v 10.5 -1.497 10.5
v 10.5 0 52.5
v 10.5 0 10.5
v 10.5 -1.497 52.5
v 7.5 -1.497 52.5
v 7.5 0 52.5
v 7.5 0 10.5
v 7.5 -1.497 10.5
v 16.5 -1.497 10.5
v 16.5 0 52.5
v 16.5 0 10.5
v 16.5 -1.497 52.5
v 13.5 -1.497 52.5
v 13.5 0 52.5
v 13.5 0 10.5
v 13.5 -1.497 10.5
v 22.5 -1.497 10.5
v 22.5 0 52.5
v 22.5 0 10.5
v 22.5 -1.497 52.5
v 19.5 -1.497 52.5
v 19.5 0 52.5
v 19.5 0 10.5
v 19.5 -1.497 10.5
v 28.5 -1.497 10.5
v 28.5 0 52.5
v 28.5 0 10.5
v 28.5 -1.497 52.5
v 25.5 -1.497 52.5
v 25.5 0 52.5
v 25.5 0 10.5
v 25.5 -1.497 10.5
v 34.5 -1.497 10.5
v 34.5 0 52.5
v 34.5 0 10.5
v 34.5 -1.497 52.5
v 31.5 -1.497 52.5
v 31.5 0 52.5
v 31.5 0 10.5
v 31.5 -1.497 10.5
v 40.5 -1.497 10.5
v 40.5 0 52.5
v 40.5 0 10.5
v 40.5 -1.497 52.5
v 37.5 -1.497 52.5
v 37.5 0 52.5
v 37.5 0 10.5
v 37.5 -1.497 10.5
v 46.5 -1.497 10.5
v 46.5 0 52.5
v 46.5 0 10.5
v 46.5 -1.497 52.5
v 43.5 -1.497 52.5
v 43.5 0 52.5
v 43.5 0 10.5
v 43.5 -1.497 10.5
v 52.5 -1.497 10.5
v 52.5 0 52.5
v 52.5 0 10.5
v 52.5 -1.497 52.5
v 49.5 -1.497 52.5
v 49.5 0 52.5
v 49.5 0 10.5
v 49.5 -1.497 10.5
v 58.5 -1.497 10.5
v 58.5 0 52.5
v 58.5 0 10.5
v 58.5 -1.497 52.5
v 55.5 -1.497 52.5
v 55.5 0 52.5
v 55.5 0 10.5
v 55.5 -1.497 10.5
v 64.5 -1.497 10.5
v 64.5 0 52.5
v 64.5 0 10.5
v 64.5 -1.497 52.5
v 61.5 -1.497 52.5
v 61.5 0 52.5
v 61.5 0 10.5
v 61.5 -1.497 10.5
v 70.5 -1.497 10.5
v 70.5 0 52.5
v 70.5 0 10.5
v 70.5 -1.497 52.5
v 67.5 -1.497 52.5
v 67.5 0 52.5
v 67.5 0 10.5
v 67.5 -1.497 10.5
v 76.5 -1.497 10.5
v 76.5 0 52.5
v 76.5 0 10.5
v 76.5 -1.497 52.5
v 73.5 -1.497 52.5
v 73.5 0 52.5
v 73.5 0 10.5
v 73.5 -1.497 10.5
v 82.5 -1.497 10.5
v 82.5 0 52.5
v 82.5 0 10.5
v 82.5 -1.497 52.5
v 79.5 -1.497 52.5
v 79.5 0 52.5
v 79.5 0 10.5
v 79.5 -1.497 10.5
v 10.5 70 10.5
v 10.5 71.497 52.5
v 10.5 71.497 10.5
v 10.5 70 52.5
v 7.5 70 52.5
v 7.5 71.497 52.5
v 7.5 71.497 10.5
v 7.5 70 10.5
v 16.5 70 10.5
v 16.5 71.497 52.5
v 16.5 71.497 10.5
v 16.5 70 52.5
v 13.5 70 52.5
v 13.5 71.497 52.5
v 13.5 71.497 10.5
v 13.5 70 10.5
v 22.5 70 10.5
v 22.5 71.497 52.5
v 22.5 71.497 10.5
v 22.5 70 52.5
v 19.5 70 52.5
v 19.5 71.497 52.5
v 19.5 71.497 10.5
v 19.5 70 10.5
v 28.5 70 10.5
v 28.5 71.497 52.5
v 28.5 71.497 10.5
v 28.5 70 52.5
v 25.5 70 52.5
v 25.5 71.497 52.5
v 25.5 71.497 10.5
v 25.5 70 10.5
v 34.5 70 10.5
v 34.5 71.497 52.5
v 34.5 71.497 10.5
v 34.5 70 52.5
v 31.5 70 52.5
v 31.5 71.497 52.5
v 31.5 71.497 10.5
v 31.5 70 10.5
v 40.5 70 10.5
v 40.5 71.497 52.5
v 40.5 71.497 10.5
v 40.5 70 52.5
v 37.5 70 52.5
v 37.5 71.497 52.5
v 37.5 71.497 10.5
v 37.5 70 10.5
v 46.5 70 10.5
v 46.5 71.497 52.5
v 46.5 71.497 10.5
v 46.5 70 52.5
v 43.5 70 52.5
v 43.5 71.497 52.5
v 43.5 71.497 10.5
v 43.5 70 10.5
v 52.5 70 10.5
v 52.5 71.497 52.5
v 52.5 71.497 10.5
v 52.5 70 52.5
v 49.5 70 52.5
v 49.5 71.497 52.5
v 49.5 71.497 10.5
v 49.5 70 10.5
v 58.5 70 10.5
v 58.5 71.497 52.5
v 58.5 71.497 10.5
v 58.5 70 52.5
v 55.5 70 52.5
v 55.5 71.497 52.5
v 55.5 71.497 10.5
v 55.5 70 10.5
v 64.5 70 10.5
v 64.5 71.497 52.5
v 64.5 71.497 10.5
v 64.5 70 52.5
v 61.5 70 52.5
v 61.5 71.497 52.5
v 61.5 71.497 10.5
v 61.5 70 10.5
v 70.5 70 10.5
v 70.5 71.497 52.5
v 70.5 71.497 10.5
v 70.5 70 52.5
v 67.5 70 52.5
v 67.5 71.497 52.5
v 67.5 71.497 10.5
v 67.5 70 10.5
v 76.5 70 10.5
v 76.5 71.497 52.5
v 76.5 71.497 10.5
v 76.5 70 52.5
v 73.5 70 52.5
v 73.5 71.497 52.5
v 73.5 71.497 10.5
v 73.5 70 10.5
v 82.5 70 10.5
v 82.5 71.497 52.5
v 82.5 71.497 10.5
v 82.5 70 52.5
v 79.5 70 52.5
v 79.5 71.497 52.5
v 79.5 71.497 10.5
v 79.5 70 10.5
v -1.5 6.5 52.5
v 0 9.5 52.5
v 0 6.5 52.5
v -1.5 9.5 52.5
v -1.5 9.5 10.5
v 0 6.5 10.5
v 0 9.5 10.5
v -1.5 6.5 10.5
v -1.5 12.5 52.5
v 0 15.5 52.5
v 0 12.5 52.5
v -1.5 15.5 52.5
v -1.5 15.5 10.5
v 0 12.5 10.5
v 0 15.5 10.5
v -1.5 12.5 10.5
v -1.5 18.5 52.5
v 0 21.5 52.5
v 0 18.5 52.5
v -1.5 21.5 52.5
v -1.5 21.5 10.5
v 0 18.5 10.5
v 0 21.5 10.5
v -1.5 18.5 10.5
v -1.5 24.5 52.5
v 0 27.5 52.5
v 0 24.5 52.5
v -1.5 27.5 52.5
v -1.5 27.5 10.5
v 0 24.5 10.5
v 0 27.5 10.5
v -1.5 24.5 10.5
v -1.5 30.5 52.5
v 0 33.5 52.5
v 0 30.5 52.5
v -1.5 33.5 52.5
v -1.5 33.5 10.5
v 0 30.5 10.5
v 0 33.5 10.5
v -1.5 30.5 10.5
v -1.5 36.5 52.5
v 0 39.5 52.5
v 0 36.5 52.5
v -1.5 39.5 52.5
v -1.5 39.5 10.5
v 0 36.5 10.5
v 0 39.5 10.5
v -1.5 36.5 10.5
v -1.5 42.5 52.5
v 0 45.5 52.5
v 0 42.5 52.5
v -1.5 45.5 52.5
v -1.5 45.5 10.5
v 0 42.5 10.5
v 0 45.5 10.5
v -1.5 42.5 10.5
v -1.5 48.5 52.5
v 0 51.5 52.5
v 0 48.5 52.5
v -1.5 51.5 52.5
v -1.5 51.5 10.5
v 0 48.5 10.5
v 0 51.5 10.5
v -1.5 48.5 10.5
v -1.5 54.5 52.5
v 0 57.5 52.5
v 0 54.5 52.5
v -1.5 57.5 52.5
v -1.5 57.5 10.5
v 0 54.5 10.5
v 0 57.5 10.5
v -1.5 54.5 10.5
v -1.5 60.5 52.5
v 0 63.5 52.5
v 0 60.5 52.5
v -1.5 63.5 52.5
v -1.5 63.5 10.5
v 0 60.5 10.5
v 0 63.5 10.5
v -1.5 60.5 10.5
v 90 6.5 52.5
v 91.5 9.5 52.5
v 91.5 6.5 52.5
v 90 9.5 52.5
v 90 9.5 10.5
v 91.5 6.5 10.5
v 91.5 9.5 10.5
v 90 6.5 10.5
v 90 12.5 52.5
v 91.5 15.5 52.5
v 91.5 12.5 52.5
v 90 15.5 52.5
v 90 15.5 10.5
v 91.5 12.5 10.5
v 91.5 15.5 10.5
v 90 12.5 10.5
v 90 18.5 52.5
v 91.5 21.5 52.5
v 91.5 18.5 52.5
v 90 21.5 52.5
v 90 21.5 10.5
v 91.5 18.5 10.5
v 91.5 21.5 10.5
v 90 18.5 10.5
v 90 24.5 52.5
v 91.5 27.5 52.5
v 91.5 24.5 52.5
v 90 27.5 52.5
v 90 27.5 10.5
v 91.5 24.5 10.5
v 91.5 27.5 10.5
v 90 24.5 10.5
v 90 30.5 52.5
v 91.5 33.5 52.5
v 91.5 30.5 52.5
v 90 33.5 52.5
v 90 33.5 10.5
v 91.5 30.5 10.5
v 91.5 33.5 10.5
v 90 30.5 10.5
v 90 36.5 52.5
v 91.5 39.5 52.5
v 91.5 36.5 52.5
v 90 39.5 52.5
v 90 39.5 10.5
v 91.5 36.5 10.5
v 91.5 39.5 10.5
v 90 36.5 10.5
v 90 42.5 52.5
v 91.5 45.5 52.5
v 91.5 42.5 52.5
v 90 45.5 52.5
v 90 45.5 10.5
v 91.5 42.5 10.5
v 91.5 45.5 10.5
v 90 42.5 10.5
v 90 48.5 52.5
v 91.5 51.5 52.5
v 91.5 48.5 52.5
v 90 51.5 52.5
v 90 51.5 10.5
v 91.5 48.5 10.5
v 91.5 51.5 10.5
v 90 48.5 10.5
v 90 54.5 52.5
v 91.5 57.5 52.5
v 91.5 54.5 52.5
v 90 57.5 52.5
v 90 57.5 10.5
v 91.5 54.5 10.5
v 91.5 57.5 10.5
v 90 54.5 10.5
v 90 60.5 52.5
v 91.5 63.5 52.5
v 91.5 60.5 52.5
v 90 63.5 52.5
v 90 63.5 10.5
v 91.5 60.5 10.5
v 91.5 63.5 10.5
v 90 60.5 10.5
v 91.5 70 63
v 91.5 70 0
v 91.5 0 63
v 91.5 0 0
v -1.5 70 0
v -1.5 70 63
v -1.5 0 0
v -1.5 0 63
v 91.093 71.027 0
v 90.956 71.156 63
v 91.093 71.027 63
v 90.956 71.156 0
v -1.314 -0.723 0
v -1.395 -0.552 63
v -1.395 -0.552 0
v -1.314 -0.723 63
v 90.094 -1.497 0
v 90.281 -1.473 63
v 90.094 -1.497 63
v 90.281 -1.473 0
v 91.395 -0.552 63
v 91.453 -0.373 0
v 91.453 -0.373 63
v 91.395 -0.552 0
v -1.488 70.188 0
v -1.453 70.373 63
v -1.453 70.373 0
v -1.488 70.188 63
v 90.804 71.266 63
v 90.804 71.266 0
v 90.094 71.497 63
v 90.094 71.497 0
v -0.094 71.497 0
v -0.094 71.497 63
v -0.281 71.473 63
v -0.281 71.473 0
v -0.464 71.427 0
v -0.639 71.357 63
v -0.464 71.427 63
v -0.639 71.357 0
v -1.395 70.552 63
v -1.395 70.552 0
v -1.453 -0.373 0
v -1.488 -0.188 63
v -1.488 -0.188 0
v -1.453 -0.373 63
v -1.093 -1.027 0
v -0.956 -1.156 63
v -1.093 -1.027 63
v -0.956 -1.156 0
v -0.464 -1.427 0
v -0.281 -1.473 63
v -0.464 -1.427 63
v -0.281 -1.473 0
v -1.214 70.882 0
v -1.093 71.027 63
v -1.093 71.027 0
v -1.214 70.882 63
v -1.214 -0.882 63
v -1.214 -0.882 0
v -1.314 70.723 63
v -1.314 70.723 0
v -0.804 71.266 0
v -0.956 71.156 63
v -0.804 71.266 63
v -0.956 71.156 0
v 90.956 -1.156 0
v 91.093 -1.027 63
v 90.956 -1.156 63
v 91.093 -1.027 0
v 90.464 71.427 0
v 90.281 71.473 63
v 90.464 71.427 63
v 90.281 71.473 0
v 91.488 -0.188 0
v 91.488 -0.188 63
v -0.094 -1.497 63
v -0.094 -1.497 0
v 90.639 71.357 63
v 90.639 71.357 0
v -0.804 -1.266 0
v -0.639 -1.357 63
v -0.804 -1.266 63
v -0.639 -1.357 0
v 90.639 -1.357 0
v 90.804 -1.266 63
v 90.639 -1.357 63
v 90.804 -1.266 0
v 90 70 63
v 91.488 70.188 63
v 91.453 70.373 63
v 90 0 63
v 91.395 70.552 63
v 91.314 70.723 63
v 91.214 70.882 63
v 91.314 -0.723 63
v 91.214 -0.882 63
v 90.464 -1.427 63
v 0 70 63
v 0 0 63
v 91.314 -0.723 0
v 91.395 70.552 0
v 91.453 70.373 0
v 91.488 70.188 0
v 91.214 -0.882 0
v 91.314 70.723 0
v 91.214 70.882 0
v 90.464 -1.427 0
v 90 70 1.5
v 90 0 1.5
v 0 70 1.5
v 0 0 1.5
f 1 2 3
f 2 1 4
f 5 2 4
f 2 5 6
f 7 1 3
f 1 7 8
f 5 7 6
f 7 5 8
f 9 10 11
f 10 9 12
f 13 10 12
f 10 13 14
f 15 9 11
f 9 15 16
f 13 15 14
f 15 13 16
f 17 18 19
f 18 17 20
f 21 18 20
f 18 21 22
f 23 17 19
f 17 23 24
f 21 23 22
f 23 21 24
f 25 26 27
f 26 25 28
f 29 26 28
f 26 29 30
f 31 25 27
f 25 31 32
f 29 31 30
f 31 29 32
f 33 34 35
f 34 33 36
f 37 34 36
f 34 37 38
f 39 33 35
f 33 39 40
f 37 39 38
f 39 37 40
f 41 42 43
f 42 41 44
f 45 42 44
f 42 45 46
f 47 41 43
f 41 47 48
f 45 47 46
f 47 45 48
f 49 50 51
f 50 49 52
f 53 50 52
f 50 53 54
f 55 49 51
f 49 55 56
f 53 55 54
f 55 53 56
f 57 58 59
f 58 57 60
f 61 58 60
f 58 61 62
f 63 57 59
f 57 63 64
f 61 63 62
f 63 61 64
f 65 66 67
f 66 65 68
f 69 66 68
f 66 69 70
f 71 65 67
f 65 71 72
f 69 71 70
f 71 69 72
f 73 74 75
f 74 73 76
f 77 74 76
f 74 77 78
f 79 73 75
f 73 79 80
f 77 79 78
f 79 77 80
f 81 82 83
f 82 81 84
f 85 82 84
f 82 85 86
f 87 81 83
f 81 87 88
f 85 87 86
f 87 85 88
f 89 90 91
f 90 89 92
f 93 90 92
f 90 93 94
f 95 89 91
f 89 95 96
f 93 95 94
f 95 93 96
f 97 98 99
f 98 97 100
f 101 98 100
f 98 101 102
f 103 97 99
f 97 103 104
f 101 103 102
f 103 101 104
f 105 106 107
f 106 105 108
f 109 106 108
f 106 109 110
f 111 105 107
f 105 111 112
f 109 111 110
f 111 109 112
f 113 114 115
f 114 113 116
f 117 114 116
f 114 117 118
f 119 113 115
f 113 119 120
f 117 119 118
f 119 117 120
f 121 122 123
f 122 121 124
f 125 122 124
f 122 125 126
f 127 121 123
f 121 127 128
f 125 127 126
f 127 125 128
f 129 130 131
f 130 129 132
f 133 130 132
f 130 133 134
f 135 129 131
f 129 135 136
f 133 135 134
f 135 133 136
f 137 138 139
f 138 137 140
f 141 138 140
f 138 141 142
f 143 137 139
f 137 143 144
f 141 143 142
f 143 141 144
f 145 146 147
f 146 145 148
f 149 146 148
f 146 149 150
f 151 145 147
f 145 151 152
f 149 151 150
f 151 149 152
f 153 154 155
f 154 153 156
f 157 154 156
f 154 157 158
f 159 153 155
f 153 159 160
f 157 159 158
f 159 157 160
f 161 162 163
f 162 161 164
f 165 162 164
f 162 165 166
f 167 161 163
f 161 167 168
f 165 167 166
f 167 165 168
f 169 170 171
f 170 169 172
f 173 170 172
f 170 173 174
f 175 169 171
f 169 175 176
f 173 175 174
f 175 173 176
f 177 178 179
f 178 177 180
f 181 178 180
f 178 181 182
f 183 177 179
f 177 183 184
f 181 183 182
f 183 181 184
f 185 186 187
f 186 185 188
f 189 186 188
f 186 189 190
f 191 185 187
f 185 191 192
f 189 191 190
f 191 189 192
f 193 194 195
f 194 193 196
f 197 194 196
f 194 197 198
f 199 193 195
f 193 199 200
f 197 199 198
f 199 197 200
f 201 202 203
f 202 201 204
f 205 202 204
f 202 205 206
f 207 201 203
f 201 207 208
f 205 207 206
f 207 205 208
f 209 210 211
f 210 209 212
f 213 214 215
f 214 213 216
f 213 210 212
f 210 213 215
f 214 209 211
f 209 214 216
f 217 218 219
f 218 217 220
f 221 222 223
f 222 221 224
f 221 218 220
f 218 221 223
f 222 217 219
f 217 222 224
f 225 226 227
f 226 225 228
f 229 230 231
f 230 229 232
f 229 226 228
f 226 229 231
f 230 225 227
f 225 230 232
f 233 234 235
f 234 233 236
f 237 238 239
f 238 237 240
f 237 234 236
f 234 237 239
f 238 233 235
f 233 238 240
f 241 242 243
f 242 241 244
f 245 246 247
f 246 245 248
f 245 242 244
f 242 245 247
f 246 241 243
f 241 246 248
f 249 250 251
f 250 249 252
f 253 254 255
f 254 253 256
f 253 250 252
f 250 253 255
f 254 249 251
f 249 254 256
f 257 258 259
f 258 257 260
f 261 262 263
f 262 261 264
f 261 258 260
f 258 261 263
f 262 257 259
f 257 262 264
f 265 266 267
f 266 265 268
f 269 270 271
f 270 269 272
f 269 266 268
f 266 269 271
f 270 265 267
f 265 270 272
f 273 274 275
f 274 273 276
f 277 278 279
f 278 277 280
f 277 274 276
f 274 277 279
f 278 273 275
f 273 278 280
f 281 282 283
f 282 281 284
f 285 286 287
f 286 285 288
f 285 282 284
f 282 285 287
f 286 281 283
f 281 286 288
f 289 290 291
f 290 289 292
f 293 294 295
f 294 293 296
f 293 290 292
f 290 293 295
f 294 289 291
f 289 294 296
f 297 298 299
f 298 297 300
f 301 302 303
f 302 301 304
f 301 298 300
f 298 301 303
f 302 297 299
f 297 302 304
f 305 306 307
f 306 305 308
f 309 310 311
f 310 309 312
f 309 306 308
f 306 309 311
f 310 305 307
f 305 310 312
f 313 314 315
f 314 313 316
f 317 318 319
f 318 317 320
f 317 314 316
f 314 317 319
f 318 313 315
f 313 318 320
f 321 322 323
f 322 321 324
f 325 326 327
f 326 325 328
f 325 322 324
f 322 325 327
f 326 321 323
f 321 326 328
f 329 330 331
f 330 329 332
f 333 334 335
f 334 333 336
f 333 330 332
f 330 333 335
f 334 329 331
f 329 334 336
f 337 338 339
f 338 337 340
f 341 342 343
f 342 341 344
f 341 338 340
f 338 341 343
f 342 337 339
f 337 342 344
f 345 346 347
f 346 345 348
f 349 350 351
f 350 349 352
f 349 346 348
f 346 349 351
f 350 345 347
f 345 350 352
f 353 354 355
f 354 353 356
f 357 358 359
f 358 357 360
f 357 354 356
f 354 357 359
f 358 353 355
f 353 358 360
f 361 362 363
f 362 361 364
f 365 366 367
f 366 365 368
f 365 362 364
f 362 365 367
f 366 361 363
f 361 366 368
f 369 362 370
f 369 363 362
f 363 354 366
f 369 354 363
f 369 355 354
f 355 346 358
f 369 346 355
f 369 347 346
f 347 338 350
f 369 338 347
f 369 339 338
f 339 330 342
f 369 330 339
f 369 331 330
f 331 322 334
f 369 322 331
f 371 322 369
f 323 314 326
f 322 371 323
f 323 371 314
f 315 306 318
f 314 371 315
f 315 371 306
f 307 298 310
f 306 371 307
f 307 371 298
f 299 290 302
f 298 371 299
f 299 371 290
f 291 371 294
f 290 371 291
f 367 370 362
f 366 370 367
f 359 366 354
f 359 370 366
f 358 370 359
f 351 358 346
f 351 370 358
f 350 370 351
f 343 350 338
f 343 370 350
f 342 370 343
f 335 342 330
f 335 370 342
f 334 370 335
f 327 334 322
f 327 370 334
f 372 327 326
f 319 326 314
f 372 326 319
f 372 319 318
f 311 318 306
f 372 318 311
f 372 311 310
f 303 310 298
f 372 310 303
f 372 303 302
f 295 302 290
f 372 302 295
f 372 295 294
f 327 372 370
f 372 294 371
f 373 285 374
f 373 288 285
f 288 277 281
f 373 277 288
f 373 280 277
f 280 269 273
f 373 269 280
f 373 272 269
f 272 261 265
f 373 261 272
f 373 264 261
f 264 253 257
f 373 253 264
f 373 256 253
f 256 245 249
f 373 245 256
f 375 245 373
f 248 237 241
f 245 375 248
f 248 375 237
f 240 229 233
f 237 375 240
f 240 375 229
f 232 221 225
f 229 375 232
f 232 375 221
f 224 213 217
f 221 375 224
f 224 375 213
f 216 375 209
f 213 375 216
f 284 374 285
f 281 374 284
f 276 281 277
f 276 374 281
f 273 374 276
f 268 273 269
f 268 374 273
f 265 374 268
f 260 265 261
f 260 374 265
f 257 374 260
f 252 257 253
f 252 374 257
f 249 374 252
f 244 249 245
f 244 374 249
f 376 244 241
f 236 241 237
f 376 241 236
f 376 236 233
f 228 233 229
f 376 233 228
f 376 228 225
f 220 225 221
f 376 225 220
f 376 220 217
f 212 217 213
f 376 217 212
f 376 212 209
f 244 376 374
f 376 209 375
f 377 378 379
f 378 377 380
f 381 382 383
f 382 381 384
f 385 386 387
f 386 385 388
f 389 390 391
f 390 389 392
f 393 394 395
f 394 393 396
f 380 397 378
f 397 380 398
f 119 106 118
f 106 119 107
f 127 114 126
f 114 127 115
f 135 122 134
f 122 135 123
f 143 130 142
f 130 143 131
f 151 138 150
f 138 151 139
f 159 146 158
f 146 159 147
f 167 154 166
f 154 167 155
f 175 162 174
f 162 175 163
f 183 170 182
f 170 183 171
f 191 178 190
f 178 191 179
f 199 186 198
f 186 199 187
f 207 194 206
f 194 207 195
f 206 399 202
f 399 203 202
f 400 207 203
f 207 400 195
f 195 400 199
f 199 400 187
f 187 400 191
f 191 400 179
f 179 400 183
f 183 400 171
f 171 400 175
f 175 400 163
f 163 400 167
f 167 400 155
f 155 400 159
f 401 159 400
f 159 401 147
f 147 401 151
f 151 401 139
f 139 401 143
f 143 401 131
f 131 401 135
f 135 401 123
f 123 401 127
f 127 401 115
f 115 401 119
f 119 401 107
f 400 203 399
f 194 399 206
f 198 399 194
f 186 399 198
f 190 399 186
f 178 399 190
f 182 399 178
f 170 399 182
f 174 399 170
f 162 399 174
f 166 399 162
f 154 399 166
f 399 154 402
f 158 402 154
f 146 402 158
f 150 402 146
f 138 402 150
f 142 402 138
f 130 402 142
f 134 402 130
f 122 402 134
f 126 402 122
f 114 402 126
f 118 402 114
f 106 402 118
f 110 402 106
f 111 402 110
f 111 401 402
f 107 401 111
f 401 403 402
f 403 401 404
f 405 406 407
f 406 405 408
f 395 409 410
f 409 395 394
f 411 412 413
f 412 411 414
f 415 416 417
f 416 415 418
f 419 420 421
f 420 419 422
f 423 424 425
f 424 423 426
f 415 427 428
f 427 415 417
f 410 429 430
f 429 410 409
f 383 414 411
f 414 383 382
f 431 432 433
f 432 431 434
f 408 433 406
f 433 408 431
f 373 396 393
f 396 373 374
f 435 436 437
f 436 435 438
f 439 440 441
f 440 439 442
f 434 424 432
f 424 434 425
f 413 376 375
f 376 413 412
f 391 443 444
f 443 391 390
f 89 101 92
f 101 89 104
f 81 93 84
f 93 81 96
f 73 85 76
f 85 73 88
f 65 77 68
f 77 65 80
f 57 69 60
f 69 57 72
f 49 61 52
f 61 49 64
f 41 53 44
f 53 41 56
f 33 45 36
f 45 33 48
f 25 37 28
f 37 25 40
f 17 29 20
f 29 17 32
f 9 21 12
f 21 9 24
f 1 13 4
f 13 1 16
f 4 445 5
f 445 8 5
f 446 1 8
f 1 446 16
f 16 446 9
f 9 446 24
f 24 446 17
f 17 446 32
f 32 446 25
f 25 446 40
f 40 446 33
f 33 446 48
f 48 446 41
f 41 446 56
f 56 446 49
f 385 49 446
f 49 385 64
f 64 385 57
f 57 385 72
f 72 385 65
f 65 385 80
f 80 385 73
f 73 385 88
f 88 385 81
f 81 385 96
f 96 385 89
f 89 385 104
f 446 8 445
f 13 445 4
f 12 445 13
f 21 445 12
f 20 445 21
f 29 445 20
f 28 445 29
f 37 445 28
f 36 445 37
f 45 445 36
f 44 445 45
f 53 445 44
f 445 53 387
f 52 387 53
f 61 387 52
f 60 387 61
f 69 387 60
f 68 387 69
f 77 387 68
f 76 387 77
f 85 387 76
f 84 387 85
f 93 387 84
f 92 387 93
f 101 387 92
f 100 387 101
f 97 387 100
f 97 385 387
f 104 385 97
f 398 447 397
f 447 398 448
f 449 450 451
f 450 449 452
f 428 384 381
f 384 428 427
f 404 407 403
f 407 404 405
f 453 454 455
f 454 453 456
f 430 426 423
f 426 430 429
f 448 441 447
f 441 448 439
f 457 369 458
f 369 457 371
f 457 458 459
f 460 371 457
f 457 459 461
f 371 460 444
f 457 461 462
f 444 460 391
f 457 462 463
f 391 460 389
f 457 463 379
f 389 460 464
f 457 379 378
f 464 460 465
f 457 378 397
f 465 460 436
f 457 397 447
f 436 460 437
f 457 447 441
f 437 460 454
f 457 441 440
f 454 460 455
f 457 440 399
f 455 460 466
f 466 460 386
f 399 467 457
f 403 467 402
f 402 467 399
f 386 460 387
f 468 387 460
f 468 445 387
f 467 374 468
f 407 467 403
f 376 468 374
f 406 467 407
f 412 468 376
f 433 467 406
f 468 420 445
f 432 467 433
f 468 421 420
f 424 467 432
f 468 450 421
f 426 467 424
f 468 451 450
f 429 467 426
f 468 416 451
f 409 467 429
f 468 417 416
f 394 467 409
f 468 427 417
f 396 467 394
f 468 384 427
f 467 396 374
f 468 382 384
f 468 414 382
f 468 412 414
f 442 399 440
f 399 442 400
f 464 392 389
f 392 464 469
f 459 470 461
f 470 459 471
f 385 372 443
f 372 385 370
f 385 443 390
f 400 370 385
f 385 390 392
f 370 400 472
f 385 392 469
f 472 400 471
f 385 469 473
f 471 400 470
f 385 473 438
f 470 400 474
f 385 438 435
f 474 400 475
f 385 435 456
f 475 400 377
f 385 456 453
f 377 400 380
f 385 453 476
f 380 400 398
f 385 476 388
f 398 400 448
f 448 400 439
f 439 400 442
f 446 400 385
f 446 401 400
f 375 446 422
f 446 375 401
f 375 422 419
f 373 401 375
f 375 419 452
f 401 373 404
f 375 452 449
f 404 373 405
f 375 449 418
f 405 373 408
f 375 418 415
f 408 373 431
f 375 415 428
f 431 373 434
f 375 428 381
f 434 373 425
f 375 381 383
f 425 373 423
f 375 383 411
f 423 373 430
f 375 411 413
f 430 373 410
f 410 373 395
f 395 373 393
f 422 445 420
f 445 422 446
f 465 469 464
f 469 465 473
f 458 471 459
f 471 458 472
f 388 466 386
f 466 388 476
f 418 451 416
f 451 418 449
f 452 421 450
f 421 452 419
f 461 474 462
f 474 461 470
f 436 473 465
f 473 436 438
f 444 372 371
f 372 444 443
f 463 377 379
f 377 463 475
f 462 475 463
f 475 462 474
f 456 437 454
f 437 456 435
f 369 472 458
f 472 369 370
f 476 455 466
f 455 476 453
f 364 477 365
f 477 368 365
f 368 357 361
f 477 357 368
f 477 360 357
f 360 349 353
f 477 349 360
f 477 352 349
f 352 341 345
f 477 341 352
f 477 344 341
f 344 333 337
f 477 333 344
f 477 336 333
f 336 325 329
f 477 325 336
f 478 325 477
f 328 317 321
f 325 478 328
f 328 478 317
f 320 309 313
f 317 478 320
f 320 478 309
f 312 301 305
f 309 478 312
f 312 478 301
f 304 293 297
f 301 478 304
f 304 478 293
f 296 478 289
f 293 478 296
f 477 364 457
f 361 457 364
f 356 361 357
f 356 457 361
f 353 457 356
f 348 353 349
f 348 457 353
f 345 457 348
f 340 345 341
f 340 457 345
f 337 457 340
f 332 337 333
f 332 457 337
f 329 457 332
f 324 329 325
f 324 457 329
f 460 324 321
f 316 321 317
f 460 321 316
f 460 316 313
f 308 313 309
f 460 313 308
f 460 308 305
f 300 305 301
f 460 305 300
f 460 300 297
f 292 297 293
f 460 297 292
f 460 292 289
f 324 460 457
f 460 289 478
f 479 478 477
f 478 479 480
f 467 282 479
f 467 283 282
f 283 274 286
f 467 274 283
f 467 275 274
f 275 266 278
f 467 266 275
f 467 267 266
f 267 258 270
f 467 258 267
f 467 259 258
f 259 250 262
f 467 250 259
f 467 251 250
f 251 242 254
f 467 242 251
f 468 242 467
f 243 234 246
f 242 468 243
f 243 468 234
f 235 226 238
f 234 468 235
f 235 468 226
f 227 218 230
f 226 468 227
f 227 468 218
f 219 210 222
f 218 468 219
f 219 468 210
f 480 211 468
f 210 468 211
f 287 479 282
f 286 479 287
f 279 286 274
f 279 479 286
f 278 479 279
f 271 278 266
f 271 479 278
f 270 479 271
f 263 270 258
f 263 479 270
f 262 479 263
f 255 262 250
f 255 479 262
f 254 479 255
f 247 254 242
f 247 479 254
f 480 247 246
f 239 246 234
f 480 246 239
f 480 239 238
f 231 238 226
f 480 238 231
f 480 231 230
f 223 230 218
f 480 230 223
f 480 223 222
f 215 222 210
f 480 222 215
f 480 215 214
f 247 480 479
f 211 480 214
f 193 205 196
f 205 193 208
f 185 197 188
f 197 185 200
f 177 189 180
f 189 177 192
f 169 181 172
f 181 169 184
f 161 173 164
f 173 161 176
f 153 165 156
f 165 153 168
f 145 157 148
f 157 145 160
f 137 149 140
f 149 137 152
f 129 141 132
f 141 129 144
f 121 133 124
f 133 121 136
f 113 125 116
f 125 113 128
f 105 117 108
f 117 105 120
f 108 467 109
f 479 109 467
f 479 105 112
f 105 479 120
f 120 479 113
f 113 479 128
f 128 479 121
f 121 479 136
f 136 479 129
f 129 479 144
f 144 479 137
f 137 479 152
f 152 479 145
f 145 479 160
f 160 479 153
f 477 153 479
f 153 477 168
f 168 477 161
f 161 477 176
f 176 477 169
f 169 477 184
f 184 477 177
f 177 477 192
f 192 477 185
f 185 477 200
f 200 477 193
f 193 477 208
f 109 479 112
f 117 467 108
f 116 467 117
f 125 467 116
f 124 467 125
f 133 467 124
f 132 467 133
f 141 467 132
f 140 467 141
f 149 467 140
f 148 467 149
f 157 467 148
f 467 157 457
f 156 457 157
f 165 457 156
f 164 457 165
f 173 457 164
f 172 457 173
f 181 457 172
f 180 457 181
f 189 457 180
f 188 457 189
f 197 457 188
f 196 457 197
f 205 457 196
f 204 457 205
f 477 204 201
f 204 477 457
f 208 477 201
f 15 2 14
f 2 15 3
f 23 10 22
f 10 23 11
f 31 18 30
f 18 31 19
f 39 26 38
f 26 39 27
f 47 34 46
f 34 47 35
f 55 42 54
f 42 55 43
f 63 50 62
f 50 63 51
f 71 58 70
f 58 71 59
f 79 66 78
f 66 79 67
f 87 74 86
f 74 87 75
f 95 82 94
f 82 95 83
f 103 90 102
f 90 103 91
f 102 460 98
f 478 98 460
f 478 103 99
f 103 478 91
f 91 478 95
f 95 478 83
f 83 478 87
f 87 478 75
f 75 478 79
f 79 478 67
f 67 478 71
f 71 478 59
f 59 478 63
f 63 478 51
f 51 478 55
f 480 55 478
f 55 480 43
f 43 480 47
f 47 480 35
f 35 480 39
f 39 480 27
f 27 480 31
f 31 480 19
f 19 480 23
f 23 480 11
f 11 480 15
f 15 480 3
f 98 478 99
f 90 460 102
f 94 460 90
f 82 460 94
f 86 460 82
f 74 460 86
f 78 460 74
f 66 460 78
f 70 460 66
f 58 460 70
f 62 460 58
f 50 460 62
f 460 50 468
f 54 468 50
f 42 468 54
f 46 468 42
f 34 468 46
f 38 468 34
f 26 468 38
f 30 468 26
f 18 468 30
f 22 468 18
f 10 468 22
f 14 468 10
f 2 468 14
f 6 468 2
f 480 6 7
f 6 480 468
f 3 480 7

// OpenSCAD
$fn=50;

case1();

module case2(){
    difference(){
        cube([89.7,69.7,1.5]);
    
        translate([4,23,0])union(){
            translate([7,0,0])cube([71,24,1.5]);
            cube([7,7,1.5]);
            translate([64.5,24,0])cube([3.5,4.5,1.5]);
        }
    }
}

module case1(){
    difference(){
        minkowski()
        {
          cube([90,70,31.5]);
          cylinder(r=1.5,h=31.5);
        }
        
        translate([0,0,1.5])cube([90,70,63]);
        
        translate([7.5,-2.5,0])lines1();
        translate([7.5,69,0])lines1();
        
        translate([-2.5,6.5,0])lines2();
        translate([89,6.5,0])lines2();
    }
}

module lines1(){
    union(){
        translate([0,0,10.5])cube([3,5,42]);
        translate([6,0,10.5])cube([3,5,42]);
        translate([12,0,10.5])cube([3,5,42]);
        translate([18,0,10.5])cube([3,5,42]);
        translate([24,0,10.5])cube([3,5,42]);
        translate([30,0,10.5])cube([3,5,42]);
        translate([36,0,10.5])cube([3,5,42]);
        translate([42,0,10.5])cube([3,5,42]);
        translate([48,0,10.5])cube([3,5,42]);
        translate([54,0,10.5])cube([3,5,42]);
        translate([60,0,10.5])cube([3,5,42]);
        translate([66,0,10.5])cube([3,5,42]);
        translate([72,0,10.5])cube([3,5,42]);
    }
}

module lines2(){
    union(){
        translate([0,0,10.5])cube([5,3,42]);
        translate([0,6,10.5])cube([5,3,42]);
        translate([0,12,10.5])cube([5,3,42]);
        translate([0,18,10.5])cube([5,3,42]);
        translate([0,24,10.5])cube([5,3,42]);
        translate([0,30,10.5])cube([5,3,42]);
        translate([0,36,10.5])cube([5,3,42]);
        translate([0,42,10.5])cube([5,3,42]);
        translate([0,48,10.5])cube([5,3,42]);
        translate([0,54,10.5])cube([5,3,42]);
    }
    
}
